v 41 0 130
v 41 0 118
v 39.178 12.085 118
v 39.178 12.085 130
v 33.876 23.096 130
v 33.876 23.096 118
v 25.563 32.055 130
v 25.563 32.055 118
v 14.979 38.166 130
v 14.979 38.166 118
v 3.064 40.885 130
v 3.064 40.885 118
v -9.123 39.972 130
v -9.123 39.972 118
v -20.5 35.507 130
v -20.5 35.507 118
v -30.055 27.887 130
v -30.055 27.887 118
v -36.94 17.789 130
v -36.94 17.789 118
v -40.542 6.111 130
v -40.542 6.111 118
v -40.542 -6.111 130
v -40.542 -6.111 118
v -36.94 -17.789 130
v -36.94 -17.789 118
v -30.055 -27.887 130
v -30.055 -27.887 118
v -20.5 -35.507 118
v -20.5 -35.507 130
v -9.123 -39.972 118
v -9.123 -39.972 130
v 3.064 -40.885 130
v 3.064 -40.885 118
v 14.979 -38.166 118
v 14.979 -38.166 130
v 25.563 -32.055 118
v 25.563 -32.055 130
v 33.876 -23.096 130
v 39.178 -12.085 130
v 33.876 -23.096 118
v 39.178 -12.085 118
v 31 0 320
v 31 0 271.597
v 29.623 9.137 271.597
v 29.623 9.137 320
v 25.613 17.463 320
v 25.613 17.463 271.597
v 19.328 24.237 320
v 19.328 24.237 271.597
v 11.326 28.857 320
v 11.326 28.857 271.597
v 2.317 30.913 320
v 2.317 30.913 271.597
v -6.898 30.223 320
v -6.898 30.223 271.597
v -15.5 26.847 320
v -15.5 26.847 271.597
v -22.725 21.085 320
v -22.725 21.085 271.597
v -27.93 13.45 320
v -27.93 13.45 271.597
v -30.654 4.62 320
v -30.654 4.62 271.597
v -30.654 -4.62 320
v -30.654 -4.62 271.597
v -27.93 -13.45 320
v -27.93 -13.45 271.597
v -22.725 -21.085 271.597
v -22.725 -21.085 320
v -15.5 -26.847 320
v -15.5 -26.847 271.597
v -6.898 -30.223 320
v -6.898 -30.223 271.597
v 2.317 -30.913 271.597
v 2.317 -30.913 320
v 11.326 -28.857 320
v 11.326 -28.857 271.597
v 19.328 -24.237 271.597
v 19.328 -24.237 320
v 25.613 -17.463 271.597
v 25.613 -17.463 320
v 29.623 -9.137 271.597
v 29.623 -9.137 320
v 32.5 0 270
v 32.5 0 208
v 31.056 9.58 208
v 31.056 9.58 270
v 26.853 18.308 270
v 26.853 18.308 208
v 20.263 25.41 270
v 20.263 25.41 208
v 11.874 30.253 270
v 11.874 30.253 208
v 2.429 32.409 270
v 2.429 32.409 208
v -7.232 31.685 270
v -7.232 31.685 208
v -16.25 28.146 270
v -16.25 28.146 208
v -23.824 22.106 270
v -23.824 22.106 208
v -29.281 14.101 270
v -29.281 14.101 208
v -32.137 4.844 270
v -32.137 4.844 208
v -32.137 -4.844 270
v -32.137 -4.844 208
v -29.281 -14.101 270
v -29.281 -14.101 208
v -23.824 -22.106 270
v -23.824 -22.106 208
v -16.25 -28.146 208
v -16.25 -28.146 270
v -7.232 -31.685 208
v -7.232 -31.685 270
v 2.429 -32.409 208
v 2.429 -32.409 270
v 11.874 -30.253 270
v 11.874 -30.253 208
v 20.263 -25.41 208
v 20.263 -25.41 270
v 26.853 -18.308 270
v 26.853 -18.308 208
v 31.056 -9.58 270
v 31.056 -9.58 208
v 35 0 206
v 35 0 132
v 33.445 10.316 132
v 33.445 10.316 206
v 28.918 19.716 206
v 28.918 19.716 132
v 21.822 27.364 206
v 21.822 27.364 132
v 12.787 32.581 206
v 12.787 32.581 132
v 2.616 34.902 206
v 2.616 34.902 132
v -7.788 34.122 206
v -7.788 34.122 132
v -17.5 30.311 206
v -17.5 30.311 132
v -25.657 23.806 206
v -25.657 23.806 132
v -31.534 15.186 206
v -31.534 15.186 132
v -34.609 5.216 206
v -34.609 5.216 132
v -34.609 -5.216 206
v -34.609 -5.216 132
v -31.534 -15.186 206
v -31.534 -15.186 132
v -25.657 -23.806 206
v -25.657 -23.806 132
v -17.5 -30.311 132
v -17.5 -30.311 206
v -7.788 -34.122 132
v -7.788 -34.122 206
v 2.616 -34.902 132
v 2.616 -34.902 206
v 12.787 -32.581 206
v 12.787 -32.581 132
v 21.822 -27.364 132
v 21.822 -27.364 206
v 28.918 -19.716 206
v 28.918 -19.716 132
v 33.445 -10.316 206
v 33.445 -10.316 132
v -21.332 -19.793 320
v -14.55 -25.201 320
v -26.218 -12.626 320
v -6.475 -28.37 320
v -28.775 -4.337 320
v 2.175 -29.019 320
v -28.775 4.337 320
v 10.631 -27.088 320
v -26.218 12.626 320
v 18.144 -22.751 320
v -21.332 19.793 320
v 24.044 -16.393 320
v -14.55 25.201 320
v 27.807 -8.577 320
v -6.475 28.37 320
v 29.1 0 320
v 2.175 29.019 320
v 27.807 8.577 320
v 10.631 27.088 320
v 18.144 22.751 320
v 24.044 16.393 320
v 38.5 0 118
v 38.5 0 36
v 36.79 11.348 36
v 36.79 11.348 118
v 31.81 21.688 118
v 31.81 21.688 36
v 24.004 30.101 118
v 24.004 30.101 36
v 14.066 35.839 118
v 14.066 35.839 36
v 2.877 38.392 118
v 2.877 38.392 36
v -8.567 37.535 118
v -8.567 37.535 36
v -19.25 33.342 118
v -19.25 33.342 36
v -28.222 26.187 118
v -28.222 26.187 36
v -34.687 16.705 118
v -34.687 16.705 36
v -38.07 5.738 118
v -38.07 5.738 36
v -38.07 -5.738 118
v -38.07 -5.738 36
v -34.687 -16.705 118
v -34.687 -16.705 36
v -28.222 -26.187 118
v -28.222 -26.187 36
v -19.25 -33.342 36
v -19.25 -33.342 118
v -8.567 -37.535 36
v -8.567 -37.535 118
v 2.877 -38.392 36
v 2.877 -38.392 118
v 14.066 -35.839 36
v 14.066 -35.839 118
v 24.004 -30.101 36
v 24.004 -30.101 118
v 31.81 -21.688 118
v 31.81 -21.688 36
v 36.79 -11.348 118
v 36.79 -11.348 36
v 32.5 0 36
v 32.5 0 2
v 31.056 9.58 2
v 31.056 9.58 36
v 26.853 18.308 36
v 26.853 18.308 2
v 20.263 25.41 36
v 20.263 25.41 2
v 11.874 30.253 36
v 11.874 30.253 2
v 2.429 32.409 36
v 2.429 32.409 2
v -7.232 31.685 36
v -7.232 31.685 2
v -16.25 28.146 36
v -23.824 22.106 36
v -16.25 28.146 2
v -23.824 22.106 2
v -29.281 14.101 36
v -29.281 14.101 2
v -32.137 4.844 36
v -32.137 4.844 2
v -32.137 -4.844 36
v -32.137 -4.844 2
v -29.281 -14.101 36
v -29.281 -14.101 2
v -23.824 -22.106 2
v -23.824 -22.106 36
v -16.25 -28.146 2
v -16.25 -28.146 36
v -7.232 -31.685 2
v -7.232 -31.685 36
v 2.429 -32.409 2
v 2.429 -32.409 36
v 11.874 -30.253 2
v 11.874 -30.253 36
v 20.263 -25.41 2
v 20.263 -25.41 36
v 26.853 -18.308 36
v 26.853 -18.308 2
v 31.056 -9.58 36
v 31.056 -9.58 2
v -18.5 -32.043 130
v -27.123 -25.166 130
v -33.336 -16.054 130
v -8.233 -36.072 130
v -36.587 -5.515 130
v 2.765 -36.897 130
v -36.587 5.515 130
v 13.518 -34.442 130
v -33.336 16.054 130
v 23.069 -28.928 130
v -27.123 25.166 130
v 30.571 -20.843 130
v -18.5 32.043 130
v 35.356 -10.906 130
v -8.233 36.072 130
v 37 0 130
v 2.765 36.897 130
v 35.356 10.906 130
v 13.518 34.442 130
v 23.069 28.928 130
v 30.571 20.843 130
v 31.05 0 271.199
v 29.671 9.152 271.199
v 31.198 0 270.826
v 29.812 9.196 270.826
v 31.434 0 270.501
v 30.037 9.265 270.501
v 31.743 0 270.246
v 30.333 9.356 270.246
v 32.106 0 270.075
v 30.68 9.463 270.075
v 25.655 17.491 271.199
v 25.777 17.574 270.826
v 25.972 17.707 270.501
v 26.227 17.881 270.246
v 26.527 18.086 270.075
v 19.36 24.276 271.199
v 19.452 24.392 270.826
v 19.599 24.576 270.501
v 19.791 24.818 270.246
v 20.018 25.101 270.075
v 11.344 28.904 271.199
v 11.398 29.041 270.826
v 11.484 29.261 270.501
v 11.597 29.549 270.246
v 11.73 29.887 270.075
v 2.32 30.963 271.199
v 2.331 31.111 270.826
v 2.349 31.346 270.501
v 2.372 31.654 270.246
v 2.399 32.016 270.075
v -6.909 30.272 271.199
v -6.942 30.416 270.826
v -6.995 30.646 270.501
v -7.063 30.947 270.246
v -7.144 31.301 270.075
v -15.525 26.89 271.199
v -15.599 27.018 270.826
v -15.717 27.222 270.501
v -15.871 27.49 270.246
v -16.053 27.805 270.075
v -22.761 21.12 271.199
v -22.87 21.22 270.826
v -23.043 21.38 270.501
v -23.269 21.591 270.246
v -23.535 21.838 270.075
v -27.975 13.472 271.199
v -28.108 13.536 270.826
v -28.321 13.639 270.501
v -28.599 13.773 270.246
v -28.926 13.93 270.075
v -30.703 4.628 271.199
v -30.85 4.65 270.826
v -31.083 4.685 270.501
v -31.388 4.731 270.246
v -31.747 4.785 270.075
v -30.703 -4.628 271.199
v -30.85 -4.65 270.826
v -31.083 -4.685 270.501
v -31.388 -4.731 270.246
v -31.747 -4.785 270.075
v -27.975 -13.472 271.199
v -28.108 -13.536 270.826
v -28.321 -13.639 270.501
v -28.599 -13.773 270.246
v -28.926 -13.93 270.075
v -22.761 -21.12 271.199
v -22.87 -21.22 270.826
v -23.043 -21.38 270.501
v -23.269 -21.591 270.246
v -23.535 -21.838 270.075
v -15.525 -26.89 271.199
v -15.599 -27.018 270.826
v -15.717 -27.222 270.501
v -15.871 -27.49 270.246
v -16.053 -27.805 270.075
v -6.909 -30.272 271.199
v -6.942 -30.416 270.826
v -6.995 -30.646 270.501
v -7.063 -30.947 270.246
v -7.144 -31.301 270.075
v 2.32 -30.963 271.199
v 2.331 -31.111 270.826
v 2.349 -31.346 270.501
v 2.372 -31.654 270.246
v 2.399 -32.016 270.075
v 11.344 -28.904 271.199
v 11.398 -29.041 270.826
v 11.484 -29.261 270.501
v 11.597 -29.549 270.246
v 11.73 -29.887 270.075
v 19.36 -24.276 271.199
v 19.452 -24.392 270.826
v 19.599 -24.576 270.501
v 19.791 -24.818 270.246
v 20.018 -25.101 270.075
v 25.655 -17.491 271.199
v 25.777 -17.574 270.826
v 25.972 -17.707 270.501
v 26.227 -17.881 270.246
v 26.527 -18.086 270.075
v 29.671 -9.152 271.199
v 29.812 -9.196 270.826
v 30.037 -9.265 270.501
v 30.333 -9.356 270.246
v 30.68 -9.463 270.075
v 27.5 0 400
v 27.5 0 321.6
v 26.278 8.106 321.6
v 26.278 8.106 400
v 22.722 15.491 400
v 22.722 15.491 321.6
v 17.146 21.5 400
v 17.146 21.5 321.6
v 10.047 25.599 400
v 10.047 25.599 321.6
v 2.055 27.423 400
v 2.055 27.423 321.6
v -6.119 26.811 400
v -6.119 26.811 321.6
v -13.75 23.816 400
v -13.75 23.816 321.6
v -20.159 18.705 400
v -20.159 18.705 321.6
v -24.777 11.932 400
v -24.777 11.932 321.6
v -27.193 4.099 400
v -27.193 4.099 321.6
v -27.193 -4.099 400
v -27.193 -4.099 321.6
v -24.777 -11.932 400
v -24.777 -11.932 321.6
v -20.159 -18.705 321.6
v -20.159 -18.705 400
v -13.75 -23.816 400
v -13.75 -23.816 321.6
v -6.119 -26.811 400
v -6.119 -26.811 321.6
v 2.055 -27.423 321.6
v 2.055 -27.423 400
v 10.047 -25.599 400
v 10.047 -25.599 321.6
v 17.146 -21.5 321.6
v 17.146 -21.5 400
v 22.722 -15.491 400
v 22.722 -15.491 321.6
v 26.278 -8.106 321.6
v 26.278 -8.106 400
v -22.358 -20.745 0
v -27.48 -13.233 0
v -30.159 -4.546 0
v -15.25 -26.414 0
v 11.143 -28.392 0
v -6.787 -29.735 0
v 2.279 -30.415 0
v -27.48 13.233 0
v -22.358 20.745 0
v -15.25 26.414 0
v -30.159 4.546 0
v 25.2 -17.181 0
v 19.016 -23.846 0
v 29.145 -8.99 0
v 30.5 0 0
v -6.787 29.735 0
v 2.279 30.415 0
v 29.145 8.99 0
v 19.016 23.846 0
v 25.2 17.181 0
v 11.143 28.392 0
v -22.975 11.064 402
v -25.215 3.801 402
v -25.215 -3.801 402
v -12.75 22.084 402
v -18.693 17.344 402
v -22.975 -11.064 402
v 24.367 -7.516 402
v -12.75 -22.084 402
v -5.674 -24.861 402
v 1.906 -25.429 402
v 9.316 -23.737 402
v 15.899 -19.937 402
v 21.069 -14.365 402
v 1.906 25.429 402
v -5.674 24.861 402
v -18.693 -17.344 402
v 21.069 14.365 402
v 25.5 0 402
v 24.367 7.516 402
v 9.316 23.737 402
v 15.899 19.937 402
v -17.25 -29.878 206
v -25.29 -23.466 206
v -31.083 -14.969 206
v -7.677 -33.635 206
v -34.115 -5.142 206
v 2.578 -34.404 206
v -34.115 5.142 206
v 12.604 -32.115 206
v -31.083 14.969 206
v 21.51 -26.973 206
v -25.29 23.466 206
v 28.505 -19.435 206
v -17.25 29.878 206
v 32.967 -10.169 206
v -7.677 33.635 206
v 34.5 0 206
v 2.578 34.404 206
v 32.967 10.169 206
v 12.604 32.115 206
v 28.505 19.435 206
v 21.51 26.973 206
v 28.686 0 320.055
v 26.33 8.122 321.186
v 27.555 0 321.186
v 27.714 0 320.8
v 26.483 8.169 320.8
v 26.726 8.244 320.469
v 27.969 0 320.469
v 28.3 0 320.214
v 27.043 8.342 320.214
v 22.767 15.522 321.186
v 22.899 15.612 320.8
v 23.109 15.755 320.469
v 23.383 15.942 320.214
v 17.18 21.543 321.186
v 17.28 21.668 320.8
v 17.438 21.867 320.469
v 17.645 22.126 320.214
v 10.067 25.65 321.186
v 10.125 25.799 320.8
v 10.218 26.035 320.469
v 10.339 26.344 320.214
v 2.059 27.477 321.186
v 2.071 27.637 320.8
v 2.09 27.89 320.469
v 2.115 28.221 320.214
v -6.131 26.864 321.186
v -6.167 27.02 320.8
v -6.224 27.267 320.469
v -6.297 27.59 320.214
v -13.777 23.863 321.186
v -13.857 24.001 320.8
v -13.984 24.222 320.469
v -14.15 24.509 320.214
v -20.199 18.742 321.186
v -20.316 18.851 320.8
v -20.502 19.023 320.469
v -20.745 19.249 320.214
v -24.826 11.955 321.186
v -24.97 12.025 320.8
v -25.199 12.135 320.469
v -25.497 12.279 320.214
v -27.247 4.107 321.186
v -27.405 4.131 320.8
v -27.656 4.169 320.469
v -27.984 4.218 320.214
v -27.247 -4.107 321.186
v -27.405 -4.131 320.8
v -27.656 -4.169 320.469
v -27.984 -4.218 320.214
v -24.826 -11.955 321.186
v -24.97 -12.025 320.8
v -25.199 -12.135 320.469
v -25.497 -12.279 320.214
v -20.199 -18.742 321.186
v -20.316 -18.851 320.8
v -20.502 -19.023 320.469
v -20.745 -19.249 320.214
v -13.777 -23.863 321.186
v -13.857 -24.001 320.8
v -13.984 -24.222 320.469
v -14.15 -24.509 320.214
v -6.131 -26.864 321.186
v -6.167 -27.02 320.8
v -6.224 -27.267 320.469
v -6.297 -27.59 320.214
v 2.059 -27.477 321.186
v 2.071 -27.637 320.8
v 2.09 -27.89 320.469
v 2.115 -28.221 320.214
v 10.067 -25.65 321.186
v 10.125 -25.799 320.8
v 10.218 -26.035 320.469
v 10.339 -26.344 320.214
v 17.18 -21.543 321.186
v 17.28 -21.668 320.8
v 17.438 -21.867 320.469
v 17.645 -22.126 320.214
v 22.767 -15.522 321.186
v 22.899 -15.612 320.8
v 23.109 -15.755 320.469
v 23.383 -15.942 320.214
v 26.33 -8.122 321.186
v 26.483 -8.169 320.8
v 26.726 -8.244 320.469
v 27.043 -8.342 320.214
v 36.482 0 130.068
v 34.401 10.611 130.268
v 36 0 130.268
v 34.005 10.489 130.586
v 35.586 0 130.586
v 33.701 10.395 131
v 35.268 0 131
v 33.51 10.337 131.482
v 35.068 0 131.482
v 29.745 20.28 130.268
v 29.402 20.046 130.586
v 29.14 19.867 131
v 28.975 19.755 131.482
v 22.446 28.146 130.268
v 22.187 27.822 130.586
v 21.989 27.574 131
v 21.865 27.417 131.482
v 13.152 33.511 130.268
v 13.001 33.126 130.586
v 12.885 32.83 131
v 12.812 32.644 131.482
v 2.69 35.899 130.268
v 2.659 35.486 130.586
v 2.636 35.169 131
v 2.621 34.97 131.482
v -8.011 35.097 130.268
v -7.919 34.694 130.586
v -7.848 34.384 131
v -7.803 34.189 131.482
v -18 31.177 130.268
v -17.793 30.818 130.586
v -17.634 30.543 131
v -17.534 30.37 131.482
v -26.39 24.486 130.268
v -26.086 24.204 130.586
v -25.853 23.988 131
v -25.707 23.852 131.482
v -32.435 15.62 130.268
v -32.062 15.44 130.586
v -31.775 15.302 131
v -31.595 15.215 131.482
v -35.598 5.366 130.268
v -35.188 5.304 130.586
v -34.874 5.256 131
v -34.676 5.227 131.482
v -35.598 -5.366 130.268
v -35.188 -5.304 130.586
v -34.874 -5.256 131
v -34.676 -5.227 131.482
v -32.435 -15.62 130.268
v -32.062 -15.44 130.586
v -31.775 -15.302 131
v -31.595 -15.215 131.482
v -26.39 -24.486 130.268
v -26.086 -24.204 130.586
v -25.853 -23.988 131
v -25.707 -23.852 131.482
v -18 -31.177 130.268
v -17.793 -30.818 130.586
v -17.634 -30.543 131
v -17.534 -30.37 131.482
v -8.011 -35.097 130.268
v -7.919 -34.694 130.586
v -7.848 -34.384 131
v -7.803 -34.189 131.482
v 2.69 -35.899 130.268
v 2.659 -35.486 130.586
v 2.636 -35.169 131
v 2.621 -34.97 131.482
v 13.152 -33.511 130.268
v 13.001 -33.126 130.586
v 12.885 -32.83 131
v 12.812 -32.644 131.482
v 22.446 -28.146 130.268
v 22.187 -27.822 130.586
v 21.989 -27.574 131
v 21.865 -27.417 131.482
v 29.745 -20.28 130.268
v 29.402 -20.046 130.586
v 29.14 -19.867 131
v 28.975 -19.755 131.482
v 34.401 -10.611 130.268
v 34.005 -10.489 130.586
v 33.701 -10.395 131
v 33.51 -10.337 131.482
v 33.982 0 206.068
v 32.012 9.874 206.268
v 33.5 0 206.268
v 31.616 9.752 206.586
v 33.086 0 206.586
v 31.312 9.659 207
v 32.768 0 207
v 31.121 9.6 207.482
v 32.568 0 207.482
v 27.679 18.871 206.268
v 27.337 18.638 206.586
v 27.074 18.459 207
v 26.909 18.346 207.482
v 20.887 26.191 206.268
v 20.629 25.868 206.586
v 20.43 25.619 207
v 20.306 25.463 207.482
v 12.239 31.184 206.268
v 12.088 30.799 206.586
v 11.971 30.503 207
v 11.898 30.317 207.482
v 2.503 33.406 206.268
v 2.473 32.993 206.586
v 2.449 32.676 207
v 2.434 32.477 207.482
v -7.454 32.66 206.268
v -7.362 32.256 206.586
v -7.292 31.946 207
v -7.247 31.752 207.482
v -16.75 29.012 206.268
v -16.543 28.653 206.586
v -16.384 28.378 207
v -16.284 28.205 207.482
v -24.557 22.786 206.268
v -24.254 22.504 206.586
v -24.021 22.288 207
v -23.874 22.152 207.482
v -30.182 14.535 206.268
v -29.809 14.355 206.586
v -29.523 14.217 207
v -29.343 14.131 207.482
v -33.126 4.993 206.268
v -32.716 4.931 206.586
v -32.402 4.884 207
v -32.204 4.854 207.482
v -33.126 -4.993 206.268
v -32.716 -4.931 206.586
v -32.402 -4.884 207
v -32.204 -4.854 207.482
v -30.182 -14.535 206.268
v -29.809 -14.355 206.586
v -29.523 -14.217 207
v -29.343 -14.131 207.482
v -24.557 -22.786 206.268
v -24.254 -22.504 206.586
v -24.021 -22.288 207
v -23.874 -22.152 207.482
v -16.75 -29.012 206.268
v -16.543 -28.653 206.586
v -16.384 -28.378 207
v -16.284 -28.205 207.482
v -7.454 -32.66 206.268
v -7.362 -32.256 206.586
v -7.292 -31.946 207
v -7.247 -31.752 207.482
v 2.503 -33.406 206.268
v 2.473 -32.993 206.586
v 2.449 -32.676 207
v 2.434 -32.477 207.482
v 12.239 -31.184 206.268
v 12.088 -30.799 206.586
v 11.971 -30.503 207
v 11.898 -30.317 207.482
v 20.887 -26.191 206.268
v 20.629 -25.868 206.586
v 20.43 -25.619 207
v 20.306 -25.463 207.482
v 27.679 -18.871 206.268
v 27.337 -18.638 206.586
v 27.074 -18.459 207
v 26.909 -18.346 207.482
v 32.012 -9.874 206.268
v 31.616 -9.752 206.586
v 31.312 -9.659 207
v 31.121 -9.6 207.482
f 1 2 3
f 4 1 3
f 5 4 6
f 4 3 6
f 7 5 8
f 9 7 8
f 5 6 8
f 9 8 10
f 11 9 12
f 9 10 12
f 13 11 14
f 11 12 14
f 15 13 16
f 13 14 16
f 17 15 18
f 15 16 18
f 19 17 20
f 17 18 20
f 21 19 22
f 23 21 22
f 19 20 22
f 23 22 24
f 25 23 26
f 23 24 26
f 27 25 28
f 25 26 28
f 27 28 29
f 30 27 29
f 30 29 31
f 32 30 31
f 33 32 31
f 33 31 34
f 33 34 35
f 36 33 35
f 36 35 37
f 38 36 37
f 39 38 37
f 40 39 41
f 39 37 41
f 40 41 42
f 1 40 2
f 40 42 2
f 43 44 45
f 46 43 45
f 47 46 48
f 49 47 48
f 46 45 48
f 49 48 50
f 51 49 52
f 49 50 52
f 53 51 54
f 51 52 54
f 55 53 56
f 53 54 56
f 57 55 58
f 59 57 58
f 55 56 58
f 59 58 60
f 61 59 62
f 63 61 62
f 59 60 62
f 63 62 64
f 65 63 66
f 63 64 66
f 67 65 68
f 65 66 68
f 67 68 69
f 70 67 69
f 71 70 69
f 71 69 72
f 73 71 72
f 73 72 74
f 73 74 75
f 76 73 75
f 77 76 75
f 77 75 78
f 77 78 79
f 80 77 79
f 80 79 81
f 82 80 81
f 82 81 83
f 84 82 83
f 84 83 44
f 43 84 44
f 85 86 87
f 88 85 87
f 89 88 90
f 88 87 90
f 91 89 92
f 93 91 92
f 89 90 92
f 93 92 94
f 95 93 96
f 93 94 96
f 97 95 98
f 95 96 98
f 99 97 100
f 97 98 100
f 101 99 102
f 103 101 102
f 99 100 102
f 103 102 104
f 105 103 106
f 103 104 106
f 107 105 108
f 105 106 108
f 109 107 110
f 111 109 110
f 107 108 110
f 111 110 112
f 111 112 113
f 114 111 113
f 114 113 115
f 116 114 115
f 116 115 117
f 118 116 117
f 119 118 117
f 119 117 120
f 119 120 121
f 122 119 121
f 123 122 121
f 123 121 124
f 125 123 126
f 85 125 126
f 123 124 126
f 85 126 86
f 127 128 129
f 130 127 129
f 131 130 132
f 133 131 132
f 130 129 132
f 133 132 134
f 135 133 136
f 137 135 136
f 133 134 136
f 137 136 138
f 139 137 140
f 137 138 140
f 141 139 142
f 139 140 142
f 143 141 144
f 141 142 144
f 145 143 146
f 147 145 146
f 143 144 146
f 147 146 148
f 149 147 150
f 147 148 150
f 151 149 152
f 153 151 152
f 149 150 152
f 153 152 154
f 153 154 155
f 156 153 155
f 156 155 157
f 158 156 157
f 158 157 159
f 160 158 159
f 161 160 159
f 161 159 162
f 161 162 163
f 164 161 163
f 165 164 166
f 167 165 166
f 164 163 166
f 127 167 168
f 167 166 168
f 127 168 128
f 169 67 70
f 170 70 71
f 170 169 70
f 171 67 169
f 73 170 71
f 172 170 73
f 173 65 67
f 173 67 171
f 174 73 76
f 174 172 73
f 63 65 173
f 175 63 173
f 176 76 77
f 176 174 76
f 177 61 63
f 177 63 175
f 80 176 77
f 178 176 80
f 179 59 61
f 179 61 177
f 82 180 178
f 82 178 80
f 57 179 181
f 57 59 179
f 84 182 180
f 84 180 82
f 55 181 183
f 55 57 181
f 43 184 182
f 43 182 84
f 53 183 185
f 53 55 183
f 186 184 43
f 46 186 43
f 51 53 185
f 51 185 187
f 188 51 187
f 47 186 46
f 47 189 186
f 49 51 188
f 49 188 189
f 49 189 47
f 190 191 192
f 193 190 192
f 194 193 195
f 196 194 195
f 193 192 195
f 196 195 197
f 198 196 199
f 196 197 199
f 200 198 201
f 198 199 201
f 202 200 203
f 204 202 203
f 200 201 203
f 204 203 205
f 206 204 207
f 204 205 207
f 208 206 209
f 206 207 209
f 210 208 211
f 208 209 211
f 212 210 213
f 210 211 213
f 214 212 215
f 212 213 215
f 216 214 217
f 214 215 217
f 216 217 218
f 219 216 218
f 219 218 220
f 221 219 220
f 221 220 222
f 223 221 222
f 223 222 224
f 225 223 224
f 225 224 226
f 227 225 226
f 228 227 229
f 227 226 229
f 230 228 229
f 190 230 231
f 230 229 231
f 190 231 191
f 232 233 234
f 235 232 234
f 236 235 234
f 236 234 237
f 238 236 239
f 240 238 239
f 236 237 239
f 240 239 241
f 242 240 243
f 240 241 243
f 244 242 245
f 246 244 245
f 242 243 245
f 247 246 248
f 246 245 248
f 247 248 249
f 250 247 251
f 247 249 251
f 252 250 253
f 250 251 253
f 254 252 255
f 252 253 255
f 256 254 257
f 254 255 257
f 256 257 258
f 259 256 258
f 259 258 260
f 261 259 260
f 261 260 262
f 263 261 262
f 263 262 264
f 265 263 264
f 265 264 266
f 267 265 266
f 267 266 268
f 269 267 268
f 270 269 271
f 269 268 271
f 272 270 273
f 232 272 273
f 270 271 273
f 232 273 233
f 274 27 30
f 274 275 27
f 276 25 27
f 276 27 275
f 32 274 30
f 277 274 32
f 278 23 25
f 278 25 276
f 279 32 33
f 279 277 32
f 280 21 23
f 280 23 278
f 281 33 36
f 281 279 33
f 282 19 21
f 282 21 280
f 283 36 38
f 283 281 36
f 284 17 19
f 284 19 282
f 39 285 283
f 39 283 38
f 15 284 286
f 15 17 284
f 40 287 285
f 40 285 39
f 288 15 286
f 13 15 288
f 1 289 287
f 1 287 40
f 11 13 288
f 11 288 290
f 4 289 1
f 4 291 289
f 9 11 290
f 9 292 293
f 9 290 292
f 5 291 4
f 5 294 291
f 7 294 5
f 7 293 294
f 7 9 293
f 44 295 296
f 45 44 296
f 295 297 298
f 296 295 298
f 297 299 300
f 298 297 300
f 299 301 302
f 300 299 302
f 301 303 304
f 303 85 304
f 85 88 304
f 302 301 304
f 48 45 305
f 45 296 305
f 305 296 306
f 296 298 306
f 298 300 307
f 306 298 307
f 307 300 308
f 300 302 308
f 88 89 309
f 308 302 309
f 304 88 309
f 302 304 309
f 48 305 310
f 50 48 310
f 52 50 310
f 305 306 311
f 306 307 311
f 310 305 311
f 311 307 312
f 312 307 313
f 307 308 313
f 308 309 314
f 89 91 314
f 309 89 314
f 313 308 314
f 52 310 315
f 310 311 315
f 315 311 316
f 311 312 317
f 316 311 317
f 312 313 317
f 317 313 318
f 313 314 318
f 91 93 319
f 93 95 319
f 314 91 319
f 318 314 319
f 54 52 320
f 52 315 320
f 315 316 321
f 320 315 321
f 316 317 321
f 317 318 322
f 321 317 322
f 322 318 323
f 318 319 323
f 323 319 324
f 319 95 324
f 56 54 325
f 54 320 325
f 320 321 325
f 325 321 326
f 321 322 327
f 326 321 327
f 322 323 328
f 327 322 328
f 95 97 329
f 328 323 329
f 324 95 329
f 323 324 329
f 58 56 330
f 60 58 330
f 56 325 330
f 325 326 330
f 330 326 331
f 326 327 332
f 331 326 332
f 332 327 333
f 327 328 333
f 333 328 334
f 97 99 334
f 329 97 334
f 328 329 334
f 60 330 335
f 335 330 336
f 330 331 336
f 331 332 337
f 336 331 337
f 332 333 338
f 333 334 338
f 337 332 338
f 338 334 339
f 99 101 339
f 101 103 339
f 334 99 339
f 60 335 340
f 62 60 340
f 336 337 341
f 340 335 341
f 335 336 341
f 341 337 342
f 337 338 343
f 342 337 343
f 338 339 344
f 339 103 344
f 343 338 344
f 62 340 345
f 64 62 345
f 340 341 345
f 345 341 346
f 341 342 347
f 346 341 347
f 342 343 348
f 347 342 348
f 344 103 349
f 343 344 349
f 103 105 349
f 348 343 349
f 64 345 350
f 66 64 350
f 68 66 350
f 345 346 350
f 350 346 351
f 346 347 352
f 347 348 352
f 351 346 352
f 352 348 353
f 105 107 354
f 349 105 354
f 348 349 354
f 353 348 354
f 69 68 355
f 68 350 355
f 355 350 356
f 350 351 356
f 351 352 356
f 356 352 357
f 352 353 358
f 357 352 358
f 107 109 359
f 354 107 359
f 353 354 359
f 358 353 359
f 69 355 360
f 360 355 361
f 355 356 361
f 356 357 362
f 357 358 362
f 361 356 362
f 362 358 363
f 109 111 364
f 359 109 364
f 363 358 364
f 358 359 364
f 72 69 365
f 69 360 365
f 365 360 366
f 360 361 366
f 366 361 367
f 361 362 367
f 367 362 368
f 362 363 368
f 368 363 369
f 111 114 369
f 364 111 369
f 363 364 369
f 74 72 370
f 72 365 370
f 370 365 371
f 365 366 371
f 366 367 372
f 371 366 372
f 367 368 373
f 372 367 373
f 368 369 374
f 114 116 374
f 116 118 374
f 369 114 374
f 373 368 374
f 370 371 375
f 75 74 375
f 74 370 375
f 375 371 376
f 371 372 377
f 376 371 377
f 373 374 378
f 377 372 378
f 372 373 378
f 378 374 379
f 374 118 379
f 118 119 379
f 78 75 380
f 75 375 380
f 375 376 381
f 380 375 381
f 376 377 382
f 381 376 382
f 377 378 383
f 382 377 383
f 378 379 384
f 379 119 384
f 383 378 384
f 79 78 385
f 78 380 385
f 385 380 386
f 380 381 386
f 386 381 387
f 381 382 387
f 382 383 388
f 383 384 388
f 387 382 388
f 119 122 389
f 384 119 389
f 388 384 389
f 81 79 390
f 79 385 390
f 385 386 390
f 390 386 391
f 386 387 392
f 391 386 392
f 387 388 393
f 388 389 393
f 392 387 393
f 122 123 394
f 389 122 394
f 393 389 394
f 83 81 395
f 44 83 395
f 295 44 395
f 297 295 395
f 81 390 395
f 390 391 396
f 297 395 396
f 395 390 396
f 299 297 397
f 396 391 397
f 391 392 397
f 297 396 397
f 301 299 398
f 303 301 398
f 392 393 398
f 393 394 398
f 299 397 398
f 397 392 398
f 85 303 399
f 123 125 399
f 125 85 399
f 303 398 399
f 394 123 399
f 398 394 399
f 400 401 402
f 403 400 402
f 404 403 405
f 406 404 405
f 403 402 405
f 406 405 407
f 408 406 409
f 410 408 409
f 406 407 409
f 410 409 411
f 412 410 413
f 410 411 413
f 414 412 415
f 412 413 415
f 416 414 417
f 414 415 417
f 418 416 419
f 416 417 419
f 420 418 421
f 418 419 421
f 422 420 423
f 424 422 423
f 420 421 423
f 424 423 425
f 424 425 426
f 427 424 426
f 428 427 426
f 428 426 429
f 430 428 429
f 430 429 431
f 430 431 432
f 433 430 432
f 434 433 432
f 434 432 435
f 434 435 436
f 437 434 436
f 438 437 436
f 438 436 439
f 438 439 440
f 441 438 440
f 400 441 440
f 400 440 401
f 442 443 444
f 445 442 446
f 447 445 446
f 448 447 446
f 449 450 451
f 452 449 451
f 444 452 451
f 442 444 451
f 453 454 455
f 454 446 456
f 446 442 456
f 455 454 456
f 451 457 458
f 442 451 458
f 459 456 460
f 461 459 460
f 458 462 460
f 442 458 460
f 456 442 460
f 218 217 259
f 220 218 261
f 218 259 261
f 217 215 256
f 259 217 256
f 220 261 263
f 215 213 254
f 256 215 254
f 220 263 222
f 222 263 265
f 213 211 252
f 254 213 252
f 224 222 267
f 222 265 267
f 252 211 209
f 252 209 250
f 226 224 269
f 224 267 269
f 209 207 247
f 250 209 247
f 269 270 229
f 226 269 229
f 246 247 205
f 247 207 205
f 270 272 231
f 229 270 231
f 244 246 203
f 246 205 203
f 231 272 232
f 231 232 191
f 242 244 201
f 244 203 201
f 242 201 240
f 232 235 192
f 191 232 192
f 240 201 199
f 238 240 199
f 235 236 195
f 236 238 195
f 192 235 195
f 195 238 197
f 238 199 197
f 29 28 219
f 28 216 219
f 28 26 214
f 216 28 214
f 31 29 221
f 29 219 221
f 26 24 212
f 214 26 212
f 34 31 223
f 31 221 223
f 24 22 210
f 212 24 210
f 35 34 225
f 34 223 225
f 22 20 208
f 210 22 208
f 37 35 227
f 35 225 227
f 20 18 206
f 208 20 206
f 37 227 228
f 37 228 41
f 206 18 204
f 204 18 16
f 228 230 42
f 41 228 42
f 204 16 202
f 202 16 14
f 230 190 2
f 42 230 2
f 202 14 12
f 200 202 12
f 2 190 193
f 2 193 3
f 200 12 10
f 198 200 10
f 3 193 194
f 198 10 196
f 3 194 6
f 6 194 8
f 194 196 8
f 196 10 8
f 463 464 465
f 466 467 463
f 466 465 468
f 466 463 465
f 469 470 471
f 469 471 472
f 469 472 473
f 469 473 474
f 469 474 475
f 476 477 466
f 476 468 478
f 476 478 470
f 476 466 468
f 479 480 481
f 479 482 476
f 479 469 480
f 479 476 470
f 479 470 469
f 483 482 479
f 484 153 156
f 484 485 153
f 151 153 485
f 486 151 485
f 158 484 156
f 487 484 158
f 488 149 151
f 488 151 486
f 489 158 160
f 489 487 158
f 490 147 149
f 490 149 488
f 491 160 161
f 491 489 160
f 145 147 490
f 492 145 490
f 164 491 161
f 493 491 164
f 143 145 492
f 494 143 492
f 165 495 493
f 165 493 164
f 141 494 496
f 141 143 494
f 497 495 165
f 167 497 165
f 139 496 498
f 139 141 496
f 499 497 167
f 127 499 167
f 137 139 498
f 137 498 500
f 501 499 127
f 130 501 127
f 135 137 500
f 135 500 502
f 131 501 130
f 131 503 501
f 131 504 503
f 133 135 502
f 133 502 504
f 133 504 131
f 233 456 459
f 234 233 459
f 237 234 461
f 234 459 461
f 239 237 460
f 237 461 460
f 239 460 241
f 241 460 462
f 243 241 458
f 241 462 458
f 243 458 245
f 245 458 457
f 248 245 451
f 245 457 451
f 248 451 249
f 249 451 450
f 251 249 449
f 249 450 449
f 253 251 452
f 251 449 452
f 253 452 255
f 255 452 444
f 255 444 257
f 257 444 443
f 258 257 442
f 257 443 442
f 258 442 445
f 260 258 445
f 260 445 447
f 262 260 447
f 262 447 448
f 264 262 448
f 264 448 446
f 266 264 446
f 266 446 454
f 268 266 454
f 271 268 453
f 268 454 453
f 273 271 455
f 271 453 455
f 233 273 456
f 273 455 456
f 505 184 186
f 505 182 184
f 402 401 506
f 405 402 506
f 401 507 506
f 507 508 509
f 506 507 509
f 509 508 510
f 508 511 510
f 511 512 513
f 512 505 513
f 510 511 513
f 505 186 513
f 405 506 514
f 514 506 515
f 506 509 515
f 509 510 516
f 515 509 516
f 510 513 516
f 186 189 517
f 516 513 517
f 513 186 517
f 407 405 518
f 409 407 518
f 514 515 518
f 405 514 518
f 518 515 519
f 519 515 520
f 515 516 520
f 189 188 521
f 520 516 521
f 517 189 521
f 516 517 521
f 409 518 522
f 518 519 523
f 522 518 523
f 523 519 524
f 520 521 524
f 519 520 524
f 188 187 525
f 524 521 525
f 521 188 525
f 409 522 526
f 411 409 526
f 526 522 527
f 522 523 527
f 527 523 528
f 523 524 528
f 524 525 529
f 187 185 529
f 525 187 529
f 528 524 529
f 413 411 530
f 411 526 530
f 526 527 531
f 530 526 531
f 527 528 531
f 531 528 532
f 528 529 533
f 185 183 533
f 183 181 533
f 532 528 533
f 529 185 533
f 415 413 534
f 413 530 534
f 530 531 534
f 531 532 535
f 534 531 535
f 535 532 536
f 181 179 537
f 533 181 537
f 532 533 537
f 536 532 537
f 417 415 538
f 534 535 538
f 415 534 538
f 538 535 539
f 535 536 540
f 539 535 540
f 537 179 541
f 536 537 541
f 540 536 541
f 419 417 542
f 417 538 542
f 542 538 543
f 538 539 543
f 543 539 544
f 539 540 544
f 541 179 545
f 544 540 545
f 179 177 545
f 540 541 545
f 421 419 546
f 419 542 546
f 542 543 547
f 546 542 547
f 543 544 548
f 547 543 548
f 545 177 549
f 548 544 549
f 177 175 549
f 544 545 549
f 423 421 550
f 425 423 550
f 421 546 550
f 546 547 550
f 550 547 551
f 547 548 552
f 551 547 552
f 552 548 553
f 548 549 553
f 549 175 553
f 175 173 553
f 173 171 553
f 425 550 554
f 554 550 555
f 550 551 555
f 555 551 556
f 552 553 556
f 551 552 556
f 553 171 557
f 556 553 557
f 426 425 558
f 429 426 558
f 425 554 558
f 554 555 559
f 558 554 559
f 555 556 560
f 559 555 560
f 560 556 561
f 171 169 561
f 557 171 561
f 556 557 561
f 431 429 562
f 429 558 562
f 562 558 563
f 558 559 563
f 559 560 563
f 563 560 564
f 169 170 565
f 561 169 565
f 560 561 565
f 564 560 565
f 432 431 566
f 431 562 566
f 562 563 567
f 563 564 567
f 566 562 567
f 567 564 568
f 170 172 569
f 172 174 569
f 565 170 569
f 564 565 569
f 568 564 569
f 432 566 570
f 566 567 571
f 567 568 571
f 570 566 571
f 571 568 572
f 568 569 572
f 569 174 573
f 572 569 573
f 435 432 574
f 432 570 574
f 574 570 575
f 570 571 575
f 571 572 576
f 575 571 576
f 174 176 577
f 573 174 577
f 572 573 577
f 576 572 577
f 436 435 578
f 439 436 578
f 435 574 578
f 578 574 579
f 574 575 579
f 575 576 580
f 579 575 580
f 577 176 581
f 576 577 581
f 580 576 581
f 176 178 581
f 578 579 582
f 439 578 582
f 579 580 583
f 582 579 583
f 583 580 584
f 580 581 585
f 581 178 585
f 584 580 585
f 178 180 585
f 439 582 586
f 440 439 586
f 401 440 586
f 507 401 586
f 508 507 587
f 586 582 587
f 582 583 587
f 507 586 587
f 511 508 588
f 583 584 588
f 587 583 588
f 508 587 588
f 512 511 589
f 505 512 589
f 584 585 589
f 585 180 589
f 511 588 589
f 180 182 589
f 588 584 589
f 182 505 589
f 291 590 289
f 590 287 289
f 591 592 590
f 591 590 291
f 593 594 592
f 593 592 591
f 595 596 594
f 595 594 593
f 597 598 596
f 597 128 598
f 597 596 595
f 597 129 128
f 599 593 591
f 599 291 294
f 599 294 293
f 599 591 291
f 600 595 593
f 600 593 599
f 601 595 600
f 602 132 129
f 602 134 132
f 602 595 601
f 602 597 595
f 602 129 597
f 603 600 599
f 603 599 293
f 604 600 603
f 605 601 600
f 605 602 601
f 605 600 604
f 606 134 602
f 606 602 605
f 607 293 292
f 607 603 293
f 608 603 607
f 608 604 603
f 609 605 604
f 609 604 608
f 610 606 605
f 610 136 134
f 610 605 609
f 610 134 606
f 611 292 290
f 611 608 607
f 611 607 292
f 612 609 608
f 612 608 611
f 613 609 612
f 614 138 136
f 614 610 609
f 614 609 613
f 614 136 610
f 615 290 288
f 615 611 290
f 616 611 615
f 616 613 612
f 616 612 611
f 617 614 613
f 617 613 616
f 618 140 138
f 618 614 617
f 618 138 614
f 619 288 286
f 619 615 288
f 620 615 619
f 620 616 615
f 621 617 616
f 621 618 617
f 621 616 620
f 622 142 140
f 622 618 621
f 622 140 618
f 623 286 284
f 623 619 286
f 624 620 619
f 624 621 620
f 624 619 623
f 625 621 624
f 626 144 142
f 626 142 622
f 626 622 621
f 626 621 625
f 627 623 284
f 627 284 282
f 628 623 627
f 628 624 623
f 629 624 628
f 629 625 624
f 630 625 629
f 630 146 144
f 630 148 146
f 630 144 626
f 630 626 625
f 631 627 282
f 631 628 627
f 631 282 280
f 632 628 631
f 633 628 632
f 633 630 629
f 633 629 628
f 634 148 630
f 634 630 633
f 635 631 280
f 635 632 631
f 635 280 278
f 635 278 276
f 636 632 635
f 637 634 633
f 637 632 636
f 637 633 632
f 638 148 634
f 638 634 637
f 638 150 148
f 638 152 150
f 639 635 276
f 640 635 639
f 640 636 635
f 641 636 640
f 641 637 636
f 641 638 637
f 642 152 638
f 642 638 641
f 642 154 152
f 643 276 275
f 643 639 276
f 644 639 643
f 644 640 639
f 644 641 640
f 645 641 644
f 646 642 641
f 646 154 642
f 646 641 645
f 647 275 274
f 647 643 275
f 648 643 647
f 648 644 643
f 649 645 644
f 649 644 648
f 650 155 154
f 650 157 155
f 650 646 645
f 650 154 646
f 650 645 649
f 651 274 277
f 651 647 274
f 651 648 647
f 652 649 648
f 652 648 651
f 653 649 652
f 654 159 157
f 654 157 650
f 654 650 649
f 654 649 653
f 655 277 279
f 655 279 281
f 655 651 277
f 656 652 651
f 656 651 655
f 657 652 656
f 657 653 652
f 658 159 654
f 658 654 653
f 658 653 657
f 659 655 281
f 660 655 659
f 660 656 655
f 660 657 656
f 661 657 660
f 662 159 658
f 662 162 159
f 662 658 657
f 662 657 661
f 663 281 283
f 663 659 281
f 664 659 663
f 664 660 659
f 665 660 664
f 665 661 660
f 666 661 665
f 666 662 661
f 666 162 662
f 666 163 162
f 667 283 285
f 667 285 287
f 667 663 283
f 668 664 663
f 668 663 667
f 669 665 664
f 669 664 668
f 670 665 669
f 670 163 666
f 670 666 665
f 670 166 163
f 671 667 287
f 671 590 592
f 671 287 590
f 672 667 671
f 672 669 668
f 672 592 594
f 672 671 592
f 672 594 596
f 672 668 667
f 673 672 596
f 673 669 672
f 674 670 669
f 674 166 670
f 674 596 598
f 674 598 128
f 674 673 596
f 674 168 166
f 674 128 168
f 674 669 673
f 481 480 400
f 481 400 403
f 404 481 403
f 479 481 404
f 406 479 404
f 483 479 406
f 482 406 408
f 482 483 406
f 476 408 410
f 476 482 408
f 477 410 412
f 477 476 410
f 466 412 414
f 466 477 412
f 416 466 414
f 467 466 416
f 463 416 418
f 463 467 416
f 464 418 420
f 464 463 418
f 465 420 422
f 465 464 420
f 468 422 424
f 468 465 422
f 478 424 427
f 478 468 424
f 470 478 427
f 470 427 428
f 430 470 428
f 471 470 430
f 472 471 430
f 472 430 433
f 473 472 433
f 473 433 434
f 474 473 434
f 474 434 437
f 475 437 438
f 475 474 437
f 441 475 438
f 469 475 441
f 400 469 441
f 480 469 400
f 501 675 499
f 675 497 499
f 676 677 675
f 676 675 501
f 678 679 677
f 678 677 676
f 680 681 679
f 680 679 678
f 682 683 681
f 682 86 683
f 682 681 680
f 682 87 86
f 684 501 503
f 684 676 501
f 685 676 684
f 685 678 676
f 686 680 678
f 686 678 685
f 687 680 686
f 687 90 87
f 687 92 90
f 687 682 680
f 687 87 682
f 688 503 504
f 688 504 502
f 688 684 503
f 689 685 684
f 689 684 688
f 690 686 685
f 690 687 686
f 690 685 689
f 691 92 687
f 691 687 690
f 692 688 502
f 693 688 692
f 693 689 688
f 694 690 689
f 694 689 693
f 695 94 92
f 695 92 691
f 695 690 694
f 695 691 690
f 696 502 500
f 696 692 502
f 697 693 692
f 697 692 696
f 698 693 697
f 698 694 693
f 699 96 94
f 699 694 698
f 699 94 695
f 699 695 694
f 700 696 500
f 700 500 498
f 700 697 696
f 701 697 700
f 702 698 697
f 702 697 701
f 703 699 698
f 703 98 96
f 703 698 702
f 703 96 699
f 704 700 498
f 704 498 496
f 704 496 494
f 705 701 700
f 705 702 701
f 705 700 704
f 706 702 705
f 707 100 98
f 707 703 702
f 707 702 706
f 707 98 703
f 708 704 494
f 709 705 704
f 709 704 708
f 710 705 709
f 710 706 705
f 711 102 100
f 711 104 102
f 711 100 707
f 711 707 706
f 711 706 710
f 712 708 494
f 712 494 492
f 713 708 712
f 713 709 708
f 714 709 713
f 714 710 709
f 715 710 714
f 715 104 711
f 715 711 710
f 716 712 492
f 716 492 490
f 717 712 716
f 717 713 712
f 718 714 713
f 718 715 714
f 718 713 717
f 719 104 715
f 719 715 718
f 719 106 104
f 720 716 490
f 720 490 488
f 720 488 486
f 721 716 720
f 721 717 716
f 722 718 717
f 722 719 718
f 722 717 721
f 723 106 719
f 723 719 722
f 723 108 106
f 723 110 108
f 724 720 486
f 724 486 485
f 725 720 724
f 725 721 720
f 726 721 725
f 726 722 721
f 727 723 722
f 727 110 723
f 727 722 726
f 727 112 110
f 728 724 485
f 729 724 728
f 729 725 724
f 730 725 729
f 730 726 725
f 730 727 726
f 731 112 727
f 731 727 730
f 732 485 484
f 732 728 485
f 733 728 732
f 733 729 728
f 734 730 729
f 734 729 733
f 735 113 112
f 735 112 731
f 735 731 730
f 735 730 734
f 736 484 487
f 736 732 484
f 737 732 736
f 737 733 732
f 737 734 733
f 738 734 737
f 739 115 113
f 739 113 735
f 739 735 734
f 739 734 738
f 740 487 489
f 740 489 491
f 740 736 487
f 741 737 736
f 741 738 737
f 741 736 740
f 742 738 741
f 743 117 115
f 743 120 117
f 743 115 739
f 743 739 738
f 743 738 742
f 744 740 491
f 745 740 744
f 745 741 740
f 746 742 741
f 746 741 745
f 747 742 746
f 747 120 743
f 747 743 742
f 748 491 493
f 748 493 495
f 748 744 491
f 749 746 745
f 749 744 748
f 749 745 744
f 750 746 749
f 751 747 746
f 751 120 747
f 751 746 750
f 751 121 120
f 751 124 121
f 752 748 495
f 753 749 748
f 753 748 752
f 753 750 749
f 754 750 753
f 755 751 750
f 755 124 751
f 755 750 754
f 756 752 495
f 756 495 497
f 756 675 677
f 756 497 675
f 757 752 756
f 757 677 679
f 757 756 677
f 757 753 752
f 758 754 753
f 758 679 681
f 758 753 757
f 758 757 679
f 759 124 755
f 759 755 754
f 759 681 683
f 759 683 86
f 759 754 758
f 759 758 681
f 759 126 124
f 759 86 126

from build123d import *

# Parameters (mm, degrees)
SKETCH_1_R      = 32.5
EXTRUDE_1_DEPTH = 36
SKETCH_2_R      = 38.5
EXTRUDE_2_DEPTH = 82
SKETCH_3_R      = 41
EXTRUDE_3_DEPTH = 12
SKETCH_4_R      = 35
EXTRUDE_4_DEPTH = 76
SKETCH_5_R      = 32.5
EXTRUDE_5_DEPTH = 64
SKETCH_6_R      = 31
EXTRUDE_6_DEPTH = 50
SKETCH_7_R      = 27.5
EXTRUDE_7_DEPTH = 82
FILLET_1_R      = 2
FILLET_2_R      = 1.6
CHAMFER_1_SIZE  = 2


with BuildPart() as part:
    # 草图1 → 凸台-拉伸1 (new body)
    with BuildSketch(Plane.XY):
        Circle(SKETCH_1_R)
    extrude(amount=EXTRUDE_1_DEPTH)

    # 草图2 → 凸台-拉伸2 (add)
    with BuildSketch(Plane.XY.offset(36)):
        Circle(SKETCH_2_R)
    extrude(amount=EXTRUDE_2_DEPTH)

    # 草图3 → 凸台-拉伸3 (add)
    with BuildSketch(Plane.XY.offset(118)):
        Circle(SKETCH_3_R)
    extrude(amount=EXTRUDE_3_DEPTH)

    # 草图4 → 凸台-拉伸4 (add)
    with BuildSketch(Plane.XY.offset(130)):
        Circle(SKETCH_4_R)
    extrude(amount=EXTRUDE_4_DEPTH)

    # 草图5 → 凸台-拉伸5 (add)
    with BuildSketch(Plane.XY.offset(206)):
        Circle(SKETCH_5_R)
    extrude(amount=EXTRUDE_5_DEPTH)

    # 草图6 → 凸台-拉伸6 (add)
    with BuildSketch(Plane.XY.offset(270)):
        Circle(SKETCH_6_R)
    extrude(amount=EXTRUDE_6_DEPTH)

    # 草图7 → 凸台-拉伸7 (add)
    with BuildSketch(Plane.XY.offset(320)):
        Circle(SKETCH_7_R)
    extrude(amount=EXTRUDE_7_DEPTH)

    # 圆角1
    fillet_1_edges = [part.edges().sort_by_distance(p)[0] for p in [
        (-35, 0, 130),
        (-32.5, 0, 206),
    ]]
    fillet(fillet_1_edges, radius=FILLET_1_R)

    # 圆角2
    # the kernel refuses this fillet: 1.6 mm, written as the material it adds along each edge
    with BuildSketch(Plane(origin=(0, 0, 270), x_dir=(1, 0, 0), z_dir=(0, -1, 0))) as fillet_2_piece_1:
        with BuildLine():
            CenterArc((32.6, 1.596871942), FILLET_2_R, 180, 86.416678302)
            Line((31, 1.596871942), (30.968, 1.596871942))
            Line((30.968, 1.596871942), (30.968, 0))
            Line((30.968, 0), (31, -0.032))
            ThreePointArc((31, -0.032), (31.75, -0.032), (32.498, -0.031937439))
            Line((32.498, -0.031937439), (32.5, 0))
        make_face()
    revolve(axis=Axis((0, 0, 270), (0, 0, 1)))
    with BuildSketch(Plane(origin=(0, 0, 320), x_dir=(1, 0, 0), z_dir=(0, -1, 0))) as fillet_2_piece_2:
        with BuildLine():
            CenterArc((27.5 + FILLET_2_R, FILLET_2_R), FILLET_2_R, 180, 90)
            Line((27.5, FILLET_2_R), (27.5 - FILLET_2_R * 0.02, FILLET_2_R))
            Line((27.5 - FILLET_2_R * 0.02, FILLET_2_R), (27.5 - FILLET_2_R * 0.02, -FILLET_2_R * 0.02))
            Line((27.5 - FILLET_2_R * 0.02, -FILLET_2_R * 0.02), (27.5 + FILLET_2_R, -FILLET_2_R * 0.02))
            Line((27.5 + FILLET_2_R, -FILLET_2_R * 0.02), (27.5 + FILLET_2_R, 0))
        make_face()
    revolve(axis=Axis((0, 0, 320), (0, 0, 1)))

    # 倒角1
    chamfer_1_edges = [part.edges().sort_by_distance(p)[0] for p in [
        (-32.5, 0, 0),
        (-27.5, 0, 402),
    ]]
    chamfer(chamfer_1_edges, length=CHAMFER_1_SIZE)


solid = part.part
